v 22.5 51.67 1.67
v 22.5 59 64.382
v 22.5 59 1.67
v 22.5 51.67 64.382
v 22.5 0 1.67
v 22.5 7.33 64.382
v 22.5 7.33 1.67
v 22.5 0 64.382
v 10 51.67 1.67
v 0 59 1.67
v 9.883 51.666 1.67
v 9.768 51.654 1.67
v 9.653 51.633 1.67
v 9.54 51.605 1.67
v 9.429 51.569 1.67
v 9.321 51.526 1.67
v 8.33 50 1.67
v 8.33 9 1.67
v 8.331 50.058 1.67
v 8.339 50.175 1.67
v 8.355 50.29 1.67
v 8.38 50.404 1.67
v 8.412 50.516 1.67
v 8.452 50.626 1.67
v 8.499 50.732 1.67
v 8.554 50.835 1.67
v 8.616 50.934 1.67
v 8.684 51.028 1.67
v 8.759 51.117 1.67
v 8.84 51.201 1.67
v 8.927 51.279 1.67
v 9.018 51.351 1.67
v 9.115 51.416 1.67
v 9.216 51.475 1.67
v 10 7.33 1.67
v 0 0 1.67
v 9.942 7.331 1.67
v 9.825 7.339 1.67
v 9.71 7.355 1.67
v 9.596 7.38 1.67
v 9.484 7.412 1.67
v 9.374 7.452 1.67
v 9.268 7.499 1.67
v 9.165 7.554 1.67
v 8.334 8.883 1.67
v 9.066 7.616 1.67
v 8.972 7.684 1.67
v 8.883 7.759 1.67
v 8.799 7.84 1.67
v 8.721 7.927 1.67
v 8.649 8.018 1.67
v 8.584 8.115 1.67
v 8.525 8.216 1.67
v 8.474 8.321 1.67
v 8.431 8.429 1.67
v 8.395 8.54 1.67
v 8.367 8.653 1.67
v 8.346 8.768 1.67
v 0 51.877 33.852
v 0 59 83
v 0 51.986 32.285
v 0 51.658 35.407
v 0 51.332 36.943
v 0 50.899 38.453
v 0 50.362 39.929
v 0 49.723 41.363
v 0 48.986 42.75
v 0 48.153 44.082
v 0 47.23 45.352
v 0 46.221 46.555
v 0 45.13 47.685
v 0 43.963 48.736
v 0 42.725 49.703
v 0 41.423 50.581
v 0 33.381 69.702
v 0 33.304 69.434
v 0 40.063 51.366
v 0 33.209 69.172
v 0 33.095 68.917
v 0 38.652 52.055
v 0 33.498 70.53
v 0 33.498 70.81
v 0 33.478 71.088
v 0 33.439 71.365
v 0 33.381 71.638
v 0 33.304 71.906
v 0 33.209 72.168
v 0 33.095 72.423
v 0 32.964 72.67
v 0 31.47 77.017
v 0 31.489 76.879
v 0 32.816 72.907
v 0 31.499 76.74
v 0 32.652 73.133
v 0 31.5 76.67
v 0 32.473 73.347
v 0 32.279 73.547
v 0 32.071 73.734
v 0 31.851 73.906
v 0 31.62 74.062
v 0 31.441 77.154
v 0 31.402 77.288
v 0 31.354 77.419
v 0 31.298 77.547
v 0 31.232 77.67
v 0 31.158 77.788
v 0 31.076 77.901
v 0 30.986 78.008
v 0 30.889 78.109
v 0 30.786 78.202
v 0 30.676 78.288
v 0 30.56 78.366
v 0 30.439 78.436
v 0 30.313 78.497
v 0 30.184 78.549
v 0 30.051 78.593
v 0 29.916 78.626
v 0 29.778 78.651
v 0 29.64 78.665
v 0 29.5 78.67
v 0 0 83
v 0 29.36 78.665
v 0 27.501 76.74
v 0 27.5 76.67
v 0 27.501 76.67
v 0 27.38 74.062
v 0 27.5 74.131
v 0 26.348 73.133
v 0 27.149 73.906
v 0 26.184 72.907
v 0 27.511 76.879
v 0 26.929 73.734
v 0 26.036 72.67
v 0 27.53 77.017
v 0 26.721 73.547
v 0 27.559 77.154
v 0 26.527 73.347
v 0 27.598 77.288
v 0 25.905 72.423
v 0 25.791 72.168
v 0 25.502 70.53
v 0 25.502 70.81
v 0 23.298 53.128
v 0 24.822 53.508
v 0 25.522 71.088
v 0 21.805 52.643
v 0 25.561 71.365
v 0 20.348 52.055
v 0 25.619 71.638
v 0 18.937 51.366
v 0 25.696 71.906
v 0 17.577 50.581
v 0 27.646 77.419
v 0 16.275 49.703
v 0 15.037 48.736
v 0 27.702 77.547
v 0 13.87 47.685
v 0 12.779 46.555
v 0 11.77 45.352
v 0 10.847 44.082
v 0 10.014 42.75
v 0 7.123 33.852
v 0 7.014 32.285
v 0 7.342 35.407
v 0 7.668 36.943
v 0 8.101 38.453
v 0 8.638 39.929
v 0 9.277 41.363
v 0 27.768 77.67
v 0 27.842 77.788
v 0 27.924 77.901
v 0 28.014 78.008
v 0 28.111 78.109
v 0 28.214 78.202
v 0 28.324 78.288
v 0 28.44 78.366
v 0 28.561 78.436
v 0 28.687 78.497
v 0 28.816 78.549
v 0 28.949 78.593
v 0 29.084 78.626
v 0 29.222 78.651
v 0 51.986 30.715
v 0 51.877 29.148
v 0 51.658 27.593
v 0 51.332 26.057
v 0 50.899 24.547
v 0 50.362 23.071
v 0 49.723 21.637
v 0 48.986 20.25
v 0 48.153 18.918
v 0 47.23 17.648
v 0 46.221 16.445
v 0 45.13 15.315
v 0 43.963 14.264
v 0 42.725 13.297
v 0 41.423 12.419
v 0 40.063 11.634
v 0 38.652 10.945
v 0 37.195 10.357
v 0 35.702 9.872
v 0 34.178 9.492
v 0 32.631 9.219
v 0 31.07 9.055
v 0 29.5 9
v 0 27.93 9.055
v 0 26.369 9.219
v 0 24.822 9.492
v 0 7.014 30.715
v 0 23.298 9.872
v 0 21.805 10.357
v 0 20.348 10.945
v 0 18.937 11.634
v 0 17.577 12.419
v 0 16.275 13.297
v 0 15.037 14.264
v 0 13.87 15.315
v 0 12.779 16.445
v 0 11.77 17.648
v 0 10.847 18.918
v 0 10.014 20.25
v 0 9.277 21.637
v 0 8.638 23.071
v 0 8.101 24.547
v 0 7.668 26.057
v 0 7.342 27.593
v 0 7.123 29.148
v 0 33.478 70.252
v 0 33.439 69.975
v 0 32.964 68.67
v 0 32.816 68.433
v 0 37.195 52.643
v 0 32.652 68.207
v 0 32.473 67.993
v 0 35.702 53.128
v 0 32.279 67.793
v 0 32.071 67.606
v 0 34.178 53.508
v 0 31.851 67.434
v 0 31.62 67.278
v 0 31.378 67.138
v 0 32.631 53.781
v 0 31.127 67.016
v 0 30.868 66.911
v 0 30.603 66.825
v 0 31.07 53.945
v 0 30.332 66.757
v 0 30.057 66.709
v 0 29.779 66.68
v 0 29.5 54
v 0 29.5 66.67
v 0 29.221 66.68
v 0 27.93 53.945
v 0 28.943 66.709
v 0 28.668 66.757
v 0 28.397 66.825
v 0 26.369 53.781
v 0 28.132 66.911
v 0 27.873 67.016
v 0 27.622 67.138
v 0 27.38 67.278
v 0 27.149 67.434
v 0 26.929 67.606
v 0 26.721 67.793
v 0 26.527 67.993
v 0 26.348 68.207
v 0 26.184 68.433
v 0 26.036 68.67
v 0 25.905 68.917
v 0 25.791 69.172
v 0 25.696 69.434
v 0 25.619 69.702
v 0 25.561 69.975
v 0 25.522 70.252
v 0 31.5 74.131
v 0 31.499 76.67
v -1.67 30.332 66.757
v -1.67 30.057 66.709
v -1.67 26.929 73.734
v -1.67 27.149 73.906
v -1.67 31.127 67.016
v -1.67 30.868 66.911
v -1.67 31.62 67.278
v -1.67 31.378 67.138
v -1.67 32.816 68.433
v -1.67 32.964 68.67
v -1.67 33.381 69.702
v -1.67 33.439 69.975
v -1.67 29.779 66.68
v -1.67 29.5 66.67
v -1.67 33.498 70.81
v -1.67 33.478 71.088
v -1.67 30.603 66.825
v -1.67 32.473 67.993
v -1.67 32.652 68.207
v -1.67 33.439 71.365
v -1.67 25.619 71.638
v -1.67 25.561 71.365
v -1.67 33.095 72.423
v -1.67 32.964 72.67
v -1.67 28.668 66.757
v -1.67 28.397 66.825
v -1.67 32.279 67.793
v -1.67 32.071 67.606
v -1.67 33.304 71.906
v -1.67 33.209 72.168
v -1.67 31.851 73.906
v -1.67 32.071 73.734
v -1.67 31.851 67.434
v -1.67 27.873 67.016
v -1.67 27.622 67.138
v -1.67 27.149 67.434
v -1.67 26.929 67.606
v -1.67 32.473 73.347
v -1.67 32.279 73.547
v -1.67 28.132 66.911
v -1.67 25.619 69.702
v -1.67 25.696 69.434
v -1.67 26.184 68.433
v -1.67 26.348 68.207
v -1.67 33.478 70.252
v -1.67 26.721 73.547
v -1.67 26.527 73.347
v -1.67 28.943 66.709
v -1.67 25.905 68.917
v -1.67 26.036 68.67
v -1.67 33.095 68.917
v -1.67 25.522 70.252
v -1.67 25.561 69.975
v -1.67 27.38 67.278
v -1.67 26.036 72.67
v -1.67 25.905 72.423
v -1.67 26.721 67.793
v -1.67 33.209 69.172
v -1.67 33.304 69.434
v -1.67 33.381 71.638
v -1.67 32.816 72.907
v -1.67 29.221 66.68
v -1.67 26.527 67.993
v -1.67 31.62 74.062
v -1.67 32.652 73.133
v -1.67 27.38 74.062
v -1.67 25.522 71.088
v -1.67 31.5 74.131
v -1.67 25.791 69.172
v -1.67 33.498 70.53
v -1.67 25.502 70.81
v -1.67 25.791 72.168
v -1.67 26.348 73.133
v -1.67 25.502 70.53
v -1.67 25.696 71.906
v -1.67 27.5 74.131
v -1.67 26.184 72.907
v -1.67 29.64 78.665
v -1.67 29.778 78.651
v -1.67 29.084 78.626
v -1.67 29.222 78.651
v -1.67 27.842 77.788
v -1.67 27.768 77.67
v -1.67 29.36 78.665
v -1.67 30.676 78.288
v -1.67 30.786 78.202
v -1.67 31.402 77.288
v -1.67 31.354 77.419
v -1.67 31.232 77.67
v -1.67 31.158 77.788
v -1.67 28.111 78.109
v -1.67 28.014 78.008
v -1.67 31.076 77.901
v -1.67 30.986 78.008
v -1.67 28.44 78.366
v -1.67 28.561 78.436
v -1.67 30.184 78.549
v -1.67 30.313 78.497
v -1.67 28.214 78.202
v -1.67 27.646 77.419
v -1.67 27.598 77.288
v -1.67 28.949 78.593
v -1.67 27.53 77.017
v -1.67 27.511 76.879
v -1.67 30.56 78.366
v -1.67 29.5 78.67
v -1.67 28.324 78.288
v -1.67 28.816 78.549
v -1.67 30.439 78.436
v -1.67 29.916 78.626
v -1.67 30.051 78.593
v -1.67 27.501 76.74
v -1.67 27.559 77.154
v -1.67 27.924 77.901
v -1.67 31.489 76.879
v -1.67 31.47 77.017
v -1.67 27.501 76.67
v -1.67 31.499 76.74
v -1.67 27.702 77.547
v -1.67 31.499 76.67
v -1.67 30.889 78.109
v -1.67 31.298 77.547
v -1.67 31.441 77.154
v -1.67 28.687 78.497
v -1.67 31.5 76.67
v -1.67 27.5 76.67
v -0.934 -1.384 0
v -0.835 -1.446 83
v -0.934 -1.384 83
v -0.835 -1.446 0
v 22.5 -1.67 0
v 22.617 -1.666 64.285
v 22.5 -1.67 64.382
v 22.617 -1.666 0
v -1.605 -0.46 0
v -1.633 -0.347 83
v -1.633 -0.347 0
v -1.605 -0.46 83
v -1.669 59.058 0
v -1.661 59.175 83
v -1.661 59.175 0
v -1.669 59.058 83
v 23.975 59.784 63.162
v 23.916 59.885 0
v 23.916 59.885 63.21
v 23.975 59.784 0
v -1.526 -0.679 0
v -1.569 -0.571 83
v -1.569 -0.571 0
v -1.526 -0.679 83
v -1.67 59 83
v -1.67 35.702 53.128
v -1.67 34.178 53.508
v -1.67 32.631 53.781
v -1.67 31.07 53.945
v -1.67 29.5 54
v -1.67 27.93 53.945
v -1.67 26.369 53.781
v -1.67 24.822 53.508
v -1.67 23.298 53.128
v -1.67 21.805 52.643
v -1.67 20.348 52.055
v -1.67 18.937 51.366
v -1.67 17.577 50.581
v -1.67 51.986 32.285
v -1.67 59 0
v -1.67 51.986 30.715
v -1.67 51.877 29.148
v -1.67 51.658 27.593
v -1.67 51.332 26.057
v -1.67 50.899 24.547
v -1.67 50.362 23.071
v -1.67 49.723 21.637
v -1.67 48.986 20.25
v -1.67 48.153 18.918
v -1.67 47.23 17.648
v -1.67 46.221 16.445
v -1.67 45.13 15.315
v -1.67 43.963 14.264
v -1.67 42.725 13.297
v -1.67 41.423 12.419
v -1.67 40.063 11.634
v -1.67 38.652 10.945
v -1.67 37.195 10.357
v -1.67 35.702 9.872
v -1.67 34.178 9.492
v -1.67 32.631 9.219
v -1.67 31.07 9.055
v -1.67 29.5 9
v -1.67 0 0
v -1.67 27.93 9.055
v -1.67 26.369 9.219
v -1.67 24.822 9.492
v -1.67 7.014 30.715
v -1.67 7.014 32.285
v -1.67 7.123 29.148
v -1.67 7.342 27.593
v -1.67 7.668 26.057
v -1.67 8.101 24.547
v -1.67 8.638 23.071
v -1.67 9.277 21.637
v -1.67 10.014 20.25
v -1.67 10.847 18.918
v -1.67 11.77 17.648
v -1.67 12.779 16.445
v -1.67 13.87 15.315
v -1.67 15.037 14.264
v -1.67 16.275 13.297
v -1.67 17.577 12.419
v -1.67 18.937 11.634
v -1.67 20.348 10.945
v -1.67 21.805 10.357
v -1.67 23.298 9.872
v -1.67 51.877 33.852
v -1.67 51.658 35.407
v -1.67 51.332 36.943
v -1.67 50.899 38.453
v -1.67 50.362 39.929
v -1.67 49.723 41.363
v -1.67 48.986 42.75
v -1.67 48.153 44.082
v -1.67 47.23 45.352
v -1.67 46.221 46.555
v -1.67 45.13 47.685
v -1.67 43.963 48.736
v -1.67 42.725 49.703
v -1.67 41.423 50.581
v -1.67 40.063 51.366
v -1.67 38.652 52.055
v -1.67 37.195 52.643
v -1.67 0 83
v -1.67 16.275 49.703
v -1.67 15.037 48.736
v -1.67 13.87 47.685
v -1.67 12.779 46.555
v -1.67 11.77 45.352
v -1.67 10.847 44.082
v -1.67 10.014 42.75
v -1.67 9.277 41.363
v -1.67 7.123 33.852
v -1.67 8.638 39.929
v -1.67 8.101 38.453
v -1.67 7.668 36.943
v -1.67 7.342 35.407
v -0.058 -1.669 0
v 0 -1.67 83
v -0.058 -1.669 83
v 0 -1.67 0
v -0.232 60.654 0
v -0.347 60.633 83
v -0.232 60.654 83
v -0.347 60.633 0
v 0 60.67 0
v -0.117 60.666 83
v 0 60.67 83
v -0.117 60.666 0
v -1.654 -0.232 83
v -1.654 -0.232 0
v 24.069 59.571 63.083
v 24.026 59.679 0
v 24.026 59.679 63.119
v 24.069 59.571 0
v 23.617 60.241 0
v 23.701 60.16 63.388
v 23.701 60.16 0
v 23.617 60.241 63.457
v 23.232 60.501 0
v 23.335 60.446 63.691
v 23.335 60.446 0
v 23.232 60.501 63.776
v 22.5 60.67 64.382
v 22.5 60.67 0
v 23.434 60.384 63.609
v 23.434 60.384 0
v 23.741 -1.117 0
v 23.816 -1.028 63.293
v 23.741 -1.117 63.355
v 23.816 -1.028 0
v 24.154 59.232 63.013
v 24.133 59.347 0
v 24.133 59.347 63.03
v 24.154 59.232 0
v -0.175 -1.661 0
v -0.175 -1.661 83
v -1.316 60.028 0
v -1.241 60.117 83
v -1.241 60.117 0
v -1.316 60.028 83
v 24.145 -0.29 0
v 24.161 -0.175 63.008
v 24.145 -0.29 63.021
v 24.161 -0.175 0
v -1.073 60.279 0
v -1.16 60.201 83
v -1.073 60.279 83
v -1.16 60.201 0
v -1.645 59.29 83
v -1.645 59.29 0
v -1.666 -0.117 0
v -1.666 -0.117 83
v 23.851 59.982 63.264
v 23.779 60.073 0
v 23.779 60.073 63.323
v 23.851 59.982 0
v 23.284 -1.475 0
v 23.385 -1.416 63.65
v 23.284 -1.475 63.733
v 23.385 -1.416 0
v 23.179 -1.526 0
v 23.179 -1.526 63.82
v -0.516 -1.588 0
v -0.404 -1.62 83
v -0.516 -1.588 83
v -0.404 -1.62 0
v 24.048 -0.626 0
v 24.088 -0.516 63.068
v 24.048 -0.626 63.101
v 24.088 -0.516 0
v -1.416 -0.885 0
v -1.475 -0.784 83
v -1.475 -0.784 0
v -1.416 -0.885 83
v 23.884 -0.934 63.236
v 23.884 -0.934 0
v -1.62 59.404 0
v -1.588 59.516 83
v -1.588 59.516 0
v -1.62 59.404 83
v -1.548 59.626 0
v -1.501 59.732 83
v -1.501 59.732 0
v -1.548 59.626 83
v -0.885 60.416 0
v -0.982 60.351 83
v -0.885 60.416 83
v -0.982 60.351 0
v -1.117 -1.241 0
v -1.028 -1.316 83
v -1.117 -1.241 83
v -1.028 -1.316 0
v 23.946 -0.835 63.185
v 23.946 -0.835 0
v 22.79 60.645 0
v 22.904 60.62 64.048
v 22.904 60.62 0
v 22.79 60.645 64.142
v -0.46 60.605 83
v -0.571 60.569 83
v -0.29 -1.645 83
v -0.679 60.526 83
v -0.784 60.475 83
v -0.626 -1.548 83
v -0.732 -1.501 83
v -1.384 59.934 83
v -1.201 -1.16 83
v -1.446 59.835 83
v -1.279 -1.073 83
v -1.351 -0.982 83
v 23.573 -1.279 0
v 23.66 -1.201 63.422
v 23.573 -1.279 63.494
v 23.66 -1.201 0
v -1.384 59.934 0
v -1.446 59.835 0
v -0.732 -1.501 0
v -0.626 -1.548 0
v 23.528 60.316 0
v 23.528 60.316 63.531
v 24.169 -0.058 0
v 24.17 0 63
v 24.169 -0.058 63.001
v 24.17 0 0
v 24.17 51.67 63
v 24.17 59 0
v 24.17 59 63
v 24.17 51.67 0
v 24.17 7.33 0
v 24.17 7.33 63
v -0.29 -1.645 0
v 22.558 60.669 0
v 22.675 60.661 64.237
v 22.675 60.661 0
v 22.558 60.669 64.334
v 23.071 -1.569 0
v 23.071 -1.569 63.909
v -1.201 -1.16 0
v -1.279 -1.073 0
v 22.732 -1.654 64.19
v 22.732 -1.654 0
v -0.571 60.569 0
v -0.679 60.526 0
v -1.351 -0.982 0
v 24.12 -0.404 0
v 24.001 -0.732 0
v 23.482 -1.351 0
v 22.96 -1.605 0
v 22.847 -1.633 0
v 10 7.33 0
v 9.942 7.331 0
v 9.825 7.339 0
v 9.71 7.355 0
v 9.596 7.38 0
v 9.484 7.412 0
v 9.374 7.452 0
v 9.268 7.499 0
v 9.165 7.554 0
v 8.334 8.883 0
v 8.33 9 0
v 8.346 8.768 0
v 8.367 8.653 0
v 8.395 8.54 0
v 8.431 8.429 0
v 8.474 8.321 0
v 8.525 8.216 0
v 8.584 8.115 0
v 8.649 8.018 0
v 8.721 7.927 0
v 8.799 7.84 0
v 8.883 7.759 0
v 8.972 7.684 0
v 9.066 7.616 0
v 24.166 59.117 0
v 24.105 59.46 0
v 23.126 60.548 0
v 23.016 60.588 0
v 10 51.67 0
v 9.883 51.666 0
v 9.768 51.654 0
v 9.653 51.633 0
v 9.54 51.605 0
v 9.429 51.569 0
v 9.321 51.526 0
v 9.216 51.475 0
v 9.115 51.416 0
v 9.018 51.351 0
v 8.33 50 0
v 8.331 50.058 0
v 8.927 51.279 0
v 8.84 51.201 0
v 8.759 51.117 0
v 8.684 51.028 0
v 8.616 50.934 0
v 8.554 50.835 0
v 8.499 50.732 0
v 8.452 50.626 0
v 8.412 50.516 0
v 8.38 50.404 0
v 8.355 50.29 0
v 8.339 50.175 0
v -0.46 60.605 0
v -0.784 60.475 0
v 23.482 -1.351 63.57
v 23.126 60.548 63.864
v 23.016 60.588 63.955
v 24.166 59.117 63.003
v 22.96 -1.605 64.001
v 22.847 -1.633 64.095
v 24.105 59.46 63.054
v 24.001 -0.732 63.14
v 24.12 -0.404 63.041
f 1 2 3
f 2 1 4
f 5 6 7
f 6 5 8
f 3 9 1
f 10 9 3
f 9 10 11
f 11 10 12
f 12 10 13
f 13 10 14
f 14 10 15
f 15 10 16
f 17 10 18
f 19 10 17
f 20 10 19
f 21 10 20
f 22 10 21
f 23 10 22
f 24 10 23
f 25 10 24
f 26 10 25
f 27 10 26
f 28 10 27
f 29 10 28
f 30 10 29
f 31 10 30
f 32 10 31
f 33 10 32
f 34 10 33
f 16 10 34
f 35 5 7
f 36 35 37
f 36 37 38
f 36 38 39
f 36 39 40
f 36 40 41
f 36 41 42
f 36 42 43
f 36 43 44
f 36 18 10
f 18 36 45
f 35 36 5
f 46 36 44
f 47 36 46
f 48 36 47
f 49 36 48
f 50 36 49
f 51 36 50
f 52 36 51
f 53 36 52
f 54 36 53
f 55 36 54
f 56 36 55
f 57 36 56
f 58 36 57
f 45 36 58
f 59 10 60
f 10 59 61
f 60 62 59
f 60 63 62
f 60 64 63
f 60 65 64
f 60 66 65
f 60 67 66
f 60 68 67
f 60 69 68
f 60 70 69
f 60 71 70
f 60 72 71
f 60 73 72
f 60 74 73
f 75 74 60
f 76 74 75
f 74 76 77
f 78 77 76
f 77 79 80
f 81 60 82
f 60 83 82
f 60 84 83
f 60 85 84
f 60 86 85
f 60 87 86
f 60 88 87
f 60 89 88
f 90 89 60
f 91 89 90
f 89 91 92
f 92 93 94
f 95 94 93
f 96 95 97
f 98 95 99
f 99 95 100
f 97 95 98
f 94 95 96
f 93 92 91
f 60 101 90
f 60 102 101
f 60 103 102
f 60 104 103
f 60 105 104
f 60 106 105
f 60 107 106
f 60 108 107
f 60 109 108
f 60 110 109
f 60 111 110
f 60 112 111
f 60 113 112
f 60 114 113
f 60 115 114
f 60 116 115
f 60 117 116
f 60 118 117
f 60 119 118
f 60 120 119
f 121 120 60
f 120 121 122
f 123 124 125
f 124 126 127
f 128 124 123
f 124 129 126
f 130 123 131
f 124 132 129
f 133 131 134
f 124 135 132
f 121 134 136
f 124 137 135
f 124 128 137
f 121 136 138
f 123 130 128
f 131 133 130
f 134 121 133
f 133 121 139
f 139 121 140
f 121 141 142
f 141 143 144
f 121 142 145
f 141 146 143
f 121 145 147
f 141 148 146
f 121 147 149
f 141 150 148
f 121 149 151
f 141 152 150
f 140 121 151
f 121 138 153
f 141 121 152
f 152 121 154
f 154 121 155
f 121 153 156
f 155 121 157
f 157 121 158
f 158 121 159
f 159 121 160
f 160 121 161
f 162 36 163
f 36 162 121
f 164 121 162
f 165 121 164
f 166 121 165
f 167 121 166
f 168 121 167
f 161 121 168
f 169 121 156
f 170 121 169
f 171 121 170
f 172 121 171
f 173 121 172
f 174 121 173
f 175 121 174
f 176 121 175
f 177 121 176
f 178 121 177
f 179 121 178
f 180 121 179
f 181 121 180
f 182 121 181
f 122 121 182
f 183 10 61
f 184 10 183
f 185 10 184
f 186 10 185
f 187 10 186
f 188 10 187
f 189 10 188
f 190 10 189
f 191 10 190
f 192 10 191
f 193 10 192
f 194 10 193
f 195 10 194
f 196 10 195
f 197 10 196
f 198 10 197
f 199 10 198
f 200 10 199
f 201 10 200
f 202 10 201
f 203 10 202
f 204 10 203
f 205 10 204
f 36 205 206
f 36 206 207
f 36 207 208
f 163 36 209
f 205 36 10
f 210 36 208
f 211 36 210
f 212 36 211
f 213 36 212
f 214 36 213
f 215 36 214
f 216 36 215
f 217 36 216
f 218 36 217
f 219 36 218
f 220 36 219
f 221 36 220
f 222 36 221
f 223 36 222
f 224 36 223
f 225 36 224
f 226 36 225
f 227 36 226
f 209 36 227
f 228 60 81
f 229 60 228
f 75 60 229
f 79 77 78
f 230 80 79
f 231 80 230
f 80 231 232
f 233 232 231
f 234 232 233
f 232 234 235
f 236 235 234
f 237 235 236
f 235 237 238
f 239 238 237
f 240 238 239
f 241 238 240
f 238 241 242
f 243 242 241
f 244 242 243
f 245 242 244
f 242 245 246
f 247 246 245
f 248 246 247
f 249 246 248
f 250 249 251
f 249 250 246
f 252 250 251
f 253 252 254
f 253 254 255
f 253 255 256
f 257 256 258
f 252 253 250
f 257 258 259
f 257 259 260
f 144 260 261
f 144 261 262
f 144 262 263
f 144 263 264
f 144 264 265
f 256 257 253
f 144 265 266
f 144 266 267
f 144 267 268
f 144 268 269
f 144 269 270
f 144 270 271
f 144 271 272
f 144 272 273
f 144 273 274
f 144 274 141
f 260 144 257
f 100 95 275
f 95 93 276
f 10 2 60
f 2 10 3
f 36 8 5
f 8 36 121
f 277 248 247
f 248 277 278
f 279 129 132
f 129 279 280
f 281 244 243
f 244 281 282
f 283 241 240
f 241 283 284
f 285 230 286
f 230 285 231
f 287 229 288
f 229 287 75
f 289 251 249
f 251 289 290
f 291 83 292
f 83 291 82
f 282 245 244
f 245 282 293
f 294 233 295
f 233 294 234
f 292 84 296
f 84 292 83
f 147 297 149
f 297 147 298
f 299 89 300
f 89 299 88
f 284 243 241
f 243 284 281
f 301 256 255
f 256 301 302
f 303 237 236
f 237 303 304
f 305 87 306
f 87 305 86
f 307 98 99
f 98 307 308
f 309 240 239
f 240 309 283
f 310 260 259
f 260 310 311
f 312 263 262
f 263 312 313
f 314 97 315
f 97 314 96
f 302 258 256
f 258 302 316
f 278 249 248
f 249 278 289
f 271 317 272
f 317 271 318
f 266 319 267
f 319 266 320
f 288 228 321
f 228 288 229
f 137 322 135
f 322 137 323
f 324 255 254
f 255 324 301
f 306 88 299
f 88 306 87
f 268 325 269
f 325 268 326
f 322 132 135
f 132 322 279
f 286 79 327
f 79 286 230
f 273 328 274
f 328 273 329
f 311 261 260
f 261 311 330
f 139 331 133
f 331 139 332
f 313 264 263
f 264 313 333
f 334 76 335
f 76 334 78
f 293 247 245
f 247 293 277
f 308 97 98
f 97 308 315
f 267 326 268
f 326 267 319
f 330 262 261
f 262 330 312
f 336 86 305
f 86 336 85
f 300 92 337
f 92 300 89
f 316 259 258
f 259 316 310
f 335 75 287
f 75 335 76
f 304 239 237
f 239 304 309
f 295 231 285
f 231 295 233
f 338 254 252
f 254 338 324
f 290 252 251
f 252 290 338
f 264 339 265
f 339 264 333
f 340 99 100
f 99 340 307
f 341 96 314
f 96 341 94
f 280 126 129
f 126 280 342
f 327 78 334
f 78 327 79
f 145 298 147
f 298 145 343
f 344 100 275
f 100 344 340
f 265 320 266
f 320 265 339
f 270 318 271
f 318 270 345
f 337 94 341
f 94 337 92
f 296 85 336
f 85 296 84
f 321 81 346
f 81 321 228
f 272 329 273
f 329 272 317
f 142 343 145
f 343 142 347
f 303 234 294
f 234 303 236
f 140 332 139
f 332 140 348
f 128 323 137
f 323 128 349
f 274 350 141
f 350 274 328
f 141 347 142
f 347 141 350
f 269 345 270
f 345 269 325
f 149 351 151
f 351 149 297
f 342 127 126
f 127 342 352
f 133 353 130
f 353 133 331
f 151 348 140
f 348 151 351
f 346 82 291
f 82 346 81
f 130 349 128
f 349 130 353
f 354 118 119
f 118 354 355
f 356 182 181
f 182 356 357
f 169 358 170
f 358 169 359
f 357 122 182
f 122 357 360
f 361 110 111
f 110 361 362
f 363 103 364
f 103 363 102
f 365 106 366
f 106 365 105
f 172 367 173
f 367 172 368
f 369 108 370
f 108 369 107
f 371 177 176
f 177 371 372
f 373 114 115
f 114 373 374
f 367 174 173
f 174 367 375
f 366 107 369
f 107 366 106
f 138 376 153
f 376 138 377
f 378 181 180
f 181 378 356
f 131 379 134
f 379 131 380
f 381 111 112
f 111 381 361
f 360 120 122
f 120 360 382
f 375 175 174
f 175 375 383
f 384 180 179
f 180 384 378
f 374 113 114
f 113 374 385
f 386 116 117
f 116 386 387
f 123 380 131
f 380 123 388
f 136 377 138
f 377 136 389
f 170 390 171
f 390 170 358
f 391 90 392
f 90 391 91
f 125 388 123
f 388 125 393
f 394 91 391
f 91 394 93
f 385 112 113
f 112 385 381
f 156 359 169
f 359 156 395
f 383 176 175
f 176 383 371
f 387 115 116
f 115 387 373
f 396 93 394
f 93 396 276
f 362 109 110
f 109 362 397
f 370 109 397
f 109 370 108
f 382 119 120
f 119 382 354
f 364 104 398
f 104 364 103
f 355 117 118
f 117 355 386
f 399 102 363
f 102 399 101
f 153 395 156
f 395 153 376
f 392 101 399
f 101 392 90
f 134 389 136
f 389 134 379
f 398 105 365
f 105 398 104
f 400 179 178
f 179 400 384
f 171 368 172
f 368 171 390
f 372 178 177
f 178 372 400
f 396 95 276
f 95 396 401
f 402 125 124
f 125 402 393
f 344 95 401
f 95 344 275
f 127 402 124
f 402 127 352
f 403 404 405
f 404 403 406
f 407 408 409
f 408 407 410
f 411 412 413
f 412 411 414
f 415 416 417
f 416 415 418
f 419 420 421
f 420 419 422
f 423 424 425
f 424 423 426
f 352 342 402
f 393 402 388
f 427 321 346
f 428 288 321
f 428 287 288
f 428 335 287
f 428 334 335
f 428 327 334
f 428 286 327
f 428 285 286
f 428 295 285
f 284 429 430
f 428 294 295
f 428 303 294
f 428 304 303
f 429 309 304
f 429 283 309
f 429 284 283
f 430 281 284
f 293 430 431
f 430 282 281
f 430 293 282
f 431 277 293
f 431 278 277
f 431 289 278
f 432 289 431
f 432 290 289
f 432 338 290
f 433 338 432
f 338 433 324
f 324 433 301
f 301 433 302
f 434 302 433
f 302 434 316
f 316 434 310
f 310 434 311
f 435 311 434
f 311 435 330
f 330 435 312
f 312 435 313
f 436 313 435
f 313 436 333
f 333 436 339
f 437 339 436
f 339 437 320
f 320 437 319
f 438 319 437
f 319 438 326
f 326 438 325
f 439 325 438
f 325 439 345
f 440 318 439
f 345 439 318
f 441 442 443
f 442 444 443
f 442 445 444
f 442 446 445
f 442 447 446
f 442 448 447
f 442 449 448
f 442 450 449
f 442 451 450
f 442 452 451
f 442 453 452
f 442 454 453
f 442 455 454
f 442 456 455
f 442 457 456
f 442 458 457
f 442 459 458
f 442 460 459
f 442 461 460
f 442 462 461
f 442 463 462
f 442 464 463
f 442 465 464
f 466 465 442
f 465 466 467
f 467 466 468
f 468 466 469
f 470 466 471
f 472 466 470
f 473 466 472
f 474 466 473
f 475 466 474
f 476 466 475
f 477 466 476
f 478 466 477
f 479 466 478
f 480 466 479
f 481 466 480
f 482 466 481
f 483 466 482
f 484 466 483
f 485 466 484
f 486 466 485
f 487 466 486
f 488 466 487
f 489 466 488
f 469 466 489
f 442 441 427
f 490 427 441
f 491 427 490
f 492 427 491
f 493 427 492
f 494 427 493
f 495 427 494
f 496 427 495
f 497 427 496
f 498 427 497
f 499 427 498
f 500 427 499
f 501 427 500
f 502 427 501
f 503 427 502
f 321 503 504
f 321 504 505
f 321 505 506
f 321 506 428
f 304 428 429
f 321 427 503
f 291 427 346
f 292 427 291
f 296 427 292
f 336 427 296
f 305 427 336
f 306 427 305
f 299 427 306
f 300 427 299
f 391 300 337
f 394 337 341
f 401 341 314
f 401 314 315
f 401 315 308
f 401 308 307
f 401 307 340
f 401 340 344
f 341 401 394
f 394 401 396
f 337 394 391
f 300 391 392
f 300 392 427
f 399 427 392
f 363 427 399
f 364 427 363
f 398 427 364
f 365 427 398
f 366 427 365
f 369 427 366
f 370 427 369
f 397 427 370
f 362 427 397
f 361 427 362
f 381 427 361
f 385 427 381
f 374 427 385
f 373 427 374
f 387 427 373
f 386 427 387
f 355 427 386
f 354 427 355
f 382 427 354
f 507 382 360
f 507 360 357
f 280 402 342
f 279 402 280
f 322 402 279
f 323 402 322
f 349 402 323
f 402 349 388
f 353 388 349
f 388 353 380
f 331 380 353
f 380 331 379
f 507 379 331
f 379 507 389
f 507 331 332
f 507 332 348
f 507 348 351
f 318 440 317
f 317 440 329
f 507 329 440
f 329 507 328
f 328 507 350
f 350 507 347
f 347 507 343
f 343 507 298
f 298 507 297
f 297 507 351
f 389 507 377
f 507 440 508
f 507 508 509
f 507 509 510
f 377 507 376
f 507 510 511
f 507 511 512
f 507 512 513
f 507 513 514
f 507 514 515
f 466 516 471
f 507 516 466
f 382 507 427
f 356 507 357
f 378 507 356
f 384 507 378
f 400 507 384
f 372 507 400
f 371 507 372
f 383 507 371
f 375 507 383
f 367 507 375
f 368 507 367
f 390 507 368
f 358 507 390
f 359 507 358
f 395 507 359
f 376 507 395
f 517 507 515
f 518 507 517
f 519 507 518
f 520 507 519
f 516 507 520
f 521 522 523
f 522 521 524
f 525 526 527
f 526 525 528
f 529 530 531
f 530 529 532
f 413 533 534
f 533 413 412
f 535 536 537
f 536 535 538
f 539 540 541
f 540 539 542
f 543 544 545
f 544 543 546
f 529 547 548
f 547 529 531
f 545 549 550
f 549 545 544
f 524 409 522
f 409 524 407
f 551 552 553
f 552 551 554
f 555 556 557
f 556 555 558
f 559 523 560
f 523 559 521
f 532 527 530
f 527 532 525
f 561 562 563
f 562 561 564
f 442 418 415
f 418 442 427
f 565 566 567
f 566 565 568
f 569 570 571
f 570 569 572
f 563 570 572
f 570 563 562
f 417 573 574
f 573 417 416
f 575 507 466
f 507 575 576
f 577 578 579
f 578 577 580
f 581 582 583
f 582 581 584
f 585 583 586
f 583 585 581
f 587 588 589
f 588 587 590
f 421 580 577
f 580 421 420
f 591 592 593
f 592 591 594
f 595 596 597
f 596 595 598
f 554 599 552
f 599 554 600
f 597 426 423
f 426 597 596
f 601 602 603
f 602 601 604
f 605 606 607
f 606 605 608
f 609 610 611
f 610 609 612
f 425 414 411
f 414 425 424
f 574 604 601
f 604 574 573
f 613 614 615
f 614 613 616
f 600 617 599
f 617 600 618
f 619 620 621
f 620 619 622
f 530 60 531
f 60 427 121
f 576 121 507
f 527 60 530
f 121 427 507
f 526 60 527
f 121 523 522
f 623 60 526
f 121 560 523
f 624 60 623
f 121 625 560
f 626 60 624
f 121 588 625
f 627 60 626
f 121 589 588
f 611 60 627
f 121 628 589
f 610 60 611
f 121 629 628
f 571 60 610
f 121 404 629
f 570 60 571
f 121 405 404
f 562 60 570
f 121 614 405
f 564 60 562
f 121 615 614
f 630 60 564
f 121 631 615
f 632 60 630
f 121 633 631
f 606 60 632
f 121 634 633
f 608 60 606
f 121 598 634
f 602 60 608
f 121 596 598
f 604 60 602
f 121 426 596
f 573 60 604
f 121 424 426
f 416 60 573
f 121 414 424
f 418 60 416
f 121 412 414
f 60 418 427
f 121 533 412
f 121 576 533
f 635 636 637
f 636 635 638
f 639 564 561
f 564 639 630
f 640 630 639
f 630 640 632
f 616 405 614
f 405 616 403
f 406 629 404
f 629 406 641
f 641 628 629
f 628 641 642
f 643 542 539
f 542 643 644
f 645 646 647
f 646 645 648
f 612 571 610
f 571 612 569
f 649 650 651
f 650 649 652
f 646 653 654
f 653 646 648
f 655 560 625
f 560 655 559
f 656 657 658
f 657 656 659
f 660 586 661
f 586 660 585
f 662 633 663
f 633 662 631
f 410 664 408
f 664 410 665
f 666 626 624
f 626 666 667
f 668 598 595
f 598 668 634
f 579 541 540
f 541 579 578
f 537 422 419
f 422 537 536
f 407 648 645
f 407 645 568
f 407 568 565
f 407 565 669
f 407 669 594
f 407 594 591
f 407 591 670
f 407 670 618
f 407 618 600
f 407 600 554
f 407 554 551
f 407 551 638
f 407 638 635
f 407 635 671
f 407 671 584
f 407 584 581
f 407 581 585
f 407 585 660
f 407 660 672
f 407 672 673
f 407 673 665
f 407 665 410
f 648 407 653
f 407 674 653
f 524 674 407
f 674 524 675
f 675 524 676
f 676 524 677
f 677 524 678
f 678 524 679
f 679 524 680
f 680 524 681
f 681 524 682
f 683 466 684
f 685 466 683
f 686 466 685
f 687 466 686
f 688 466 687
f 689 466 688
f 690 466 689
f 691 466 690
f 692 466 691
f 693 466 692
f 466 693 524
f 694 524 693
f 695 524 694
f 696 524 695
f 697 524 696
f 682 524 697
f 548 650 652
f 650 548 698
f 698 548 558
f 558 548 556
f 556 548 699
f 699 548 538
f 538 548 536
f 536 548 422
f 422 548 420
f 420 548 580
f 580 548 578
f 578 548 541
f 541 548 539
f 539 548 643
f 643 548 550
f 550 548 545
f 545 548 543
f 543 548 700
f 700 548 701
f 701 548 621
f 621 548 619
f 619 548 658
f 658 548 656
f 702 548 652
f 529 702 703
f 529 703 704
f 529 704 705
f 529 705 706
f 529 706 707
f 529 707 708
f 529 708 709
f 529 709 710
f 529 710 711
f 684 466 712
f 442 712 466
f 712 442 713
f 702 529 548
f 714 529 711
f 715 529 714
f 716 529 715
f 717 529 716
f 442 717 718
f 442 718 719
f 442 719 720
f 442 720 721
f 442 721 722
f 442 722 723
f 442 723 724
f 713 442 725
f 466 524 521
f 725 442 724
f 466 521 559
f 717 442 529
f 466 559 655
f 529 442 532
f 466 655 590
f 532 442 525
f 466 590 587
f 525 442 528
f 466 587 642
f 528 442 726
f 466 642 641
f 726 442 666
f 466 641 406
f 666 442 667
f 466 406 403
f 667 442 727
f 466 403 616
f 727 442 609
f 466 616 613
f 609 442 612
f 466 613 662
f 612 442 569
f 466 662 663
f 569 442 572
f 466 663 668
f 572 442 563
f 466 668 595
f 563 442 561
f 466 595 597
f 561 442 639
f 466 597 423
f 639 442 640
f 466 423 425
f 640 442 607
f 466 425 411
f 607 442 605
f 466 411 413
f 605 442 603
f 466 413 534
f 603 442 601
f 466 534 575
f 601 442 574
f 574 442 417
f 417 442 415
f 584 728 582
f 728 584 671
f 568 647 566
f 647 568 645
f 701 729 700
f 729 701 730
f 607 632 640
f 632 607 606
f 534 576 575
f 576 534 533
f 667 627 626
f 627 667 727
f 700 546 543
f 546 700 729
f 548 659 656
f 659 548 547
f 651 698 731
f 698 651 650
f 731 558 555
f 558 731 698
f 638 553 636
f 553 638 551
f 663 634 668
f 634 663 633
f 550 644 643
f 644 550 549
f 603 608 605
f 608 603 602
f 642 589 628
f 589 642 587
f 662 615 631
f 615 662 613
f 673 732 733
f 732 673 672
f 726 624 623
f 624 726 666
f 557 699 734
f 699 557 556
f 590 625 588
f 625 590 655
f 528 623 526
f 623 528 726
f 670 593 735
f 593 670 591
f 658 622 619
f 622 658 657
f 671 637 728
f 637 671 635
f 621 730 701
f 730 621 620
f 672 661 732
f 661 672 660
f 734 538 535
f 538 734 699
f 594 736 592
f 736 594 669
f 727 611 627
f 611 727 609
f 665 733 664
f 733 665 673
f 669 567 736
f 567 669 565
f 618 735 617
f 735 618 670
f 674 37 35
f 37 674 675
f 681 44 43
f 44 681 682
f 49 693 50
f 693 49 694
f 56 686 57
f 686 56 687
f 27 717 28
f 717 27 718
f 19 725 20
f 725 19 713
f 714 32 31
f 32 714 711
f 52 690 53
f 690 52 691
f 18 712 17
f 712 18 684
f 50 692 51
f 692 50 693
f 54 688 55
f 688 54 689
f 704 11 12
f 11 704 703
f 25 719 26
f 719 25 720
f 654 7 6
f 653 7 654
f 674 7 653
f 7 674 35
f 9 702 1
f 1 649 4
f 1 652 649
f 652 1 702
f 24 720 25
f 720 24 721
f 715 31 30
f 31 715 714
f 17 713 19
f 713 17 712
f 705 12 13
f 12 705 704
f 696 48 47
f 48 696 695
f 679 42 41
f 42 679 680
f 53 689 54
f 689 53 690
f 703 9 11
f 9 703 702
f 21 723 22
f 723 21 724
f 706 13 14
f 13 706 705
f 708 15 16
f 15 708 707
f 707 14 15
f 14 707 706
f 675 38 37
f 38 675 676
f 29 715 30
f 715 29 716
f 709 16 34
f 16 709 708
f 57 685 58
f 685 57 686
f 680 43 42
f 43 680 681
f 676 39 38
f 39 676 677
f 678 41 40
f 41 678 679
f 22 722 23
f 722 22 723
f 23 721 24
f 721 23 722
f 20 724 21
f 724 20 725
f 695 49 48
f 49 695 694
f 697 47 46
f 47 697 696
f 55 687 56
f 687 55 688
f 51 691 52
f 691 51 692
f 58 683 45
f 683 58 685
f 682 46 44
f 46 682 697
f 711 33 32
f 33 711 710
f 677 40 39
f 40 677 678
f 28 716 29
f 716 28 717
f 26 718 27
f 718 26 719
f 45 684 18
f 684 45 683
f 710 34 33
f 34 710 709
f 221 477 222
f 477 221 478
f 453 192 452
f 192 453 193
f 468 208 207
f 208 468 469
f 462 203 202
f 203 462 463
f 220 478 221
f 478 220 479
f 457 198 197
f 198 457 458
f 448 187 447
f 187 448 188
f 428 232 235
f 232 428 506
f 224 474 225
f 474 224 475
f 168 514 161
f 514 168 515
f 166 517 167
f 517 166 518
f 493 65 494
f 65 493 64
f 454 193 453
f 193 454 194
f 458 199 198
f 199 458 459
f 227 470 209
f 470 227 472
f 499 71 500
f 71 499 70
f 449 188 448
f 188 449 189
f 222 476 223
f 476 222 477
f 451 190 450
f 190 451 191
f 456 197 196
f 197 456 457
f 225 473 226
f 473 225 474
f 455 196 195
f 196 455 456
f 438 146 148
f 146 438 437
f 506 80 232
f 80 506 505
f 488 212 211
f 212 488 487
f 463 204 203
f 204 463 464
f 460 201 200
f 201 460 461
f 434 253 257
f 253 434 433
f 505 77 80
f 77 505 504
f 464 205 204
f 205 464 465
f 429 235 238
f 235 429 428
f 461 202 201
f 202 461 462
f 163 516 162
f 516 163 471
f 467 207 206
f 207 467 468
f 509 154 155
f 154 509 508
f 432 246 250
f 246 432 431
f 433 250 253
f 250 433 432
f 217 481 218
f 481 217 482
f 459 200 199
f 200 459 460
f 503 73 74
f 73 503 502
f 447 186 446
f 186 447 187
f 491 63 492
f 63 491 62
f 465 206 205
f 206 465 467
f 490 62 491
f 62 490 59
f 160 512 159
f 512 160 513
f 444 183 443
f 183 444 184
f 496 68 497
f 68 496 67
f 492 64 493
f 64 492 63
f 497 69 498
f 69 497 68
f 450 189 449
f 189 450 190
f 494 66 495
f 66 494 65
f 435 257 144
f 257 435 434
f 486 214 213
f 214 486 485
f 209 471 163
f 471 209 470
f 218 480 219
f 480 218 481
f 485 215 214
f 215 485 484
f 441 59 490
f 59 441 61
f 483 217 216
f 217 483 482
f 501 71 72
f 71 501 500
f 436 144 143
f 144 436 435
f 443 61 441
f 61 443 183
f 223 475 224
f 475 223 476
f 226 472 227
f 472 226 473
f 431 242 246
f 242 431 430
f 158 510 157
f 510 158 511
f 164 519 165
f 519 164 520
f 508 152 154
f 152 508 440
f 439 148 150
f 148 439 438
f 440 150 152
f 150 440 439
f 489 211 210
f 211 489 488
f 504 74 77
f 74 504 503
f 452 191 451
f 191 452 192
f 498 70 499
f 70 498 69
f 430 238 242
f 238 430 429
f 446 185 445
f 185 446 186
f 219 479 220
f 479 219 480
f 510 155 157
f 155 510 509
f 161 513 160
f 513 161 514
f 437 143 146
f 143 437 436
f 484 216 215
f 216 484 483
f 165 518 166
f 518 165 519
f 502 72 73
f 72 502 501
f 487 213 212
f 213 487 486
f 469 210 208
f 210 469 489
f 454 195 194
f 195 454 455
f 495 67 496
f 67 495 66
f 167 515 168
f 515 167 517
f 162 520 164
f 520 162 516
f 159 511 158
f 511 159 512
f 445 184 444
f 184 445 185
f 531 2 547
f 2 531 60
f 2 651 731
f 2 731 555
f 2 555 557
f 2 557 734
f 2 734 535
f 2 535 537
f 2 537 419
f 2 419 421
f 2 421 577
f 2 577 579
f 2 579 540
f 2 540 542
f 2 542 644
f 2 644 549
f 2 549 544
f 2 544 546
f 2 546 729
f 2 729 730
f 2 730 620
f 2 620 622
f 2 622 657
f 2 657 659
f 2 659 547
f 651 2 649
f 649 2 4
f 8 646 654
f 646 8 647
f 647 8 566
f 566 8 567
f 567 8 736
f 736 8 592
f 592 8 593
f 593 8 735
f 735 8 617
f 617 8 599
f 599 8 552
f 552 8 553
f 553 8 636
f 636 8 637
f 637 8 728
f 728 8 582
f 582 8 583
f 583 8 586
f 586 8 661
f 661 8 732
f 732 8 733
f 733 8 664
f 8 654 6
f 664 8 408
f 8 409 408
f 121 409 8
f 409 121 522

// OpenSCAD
/*
 * Sonoff SNZB-02WD holder
 *
 * Author: Pavel Rampas
 * Version: 1.0.0 (Changelog is at the bottom)
 * License: CC BY-SA 4.0 [https://creativecommons.org/licenses/by-sa/4.0/]
 * Link: https://github.com/pavelrampas/openscad-models
 *
 * OpenSCAD version: 2021.01
 *
 * Instructions:
 * Set up parameters, render and print.
 *
 * Height is layer.
 * Thickness is perimeter.
 */

// Parameters
//------------------------------------------------------------------------------

$fn = $preview ? 15 : 90;

// Parameters that don't need to be changed
//------------------------------------------------------------------------------

thickness = 1.67;
height = 22 + 0.5;
width = 58.5 + 0.5;
length = 63;

holderLength = 20;
holderHoleSmall = 4;
holderHoleLarge = 8;

frontHole = width - 18;

backHoleD = 45;

// Code
//------------------------------------------------------------------------------

// Box
difference() {
    // Box
    linear_extrude(length + holderLength) {
        offset(r = thickness) {
            square([height, width]);
        }
    }

    // Sonoff
    translate([0, 0, thickness]) {
        cube([height, width, length + holderLength]);
        #cube([height, width, length]);
    }

    // Hole front
    translate([10, (width - frontHole) / 2, 0]) {
        linear_extrude(length + holderLength) {
            offset(r = thickness) {
                square([height, frontHole]);
            }
        }
    }

    // Hole back
    translate([-thickness, width / 2, length / 2]) {
        rotate([0, 90, 0]) {
            cylinder(h = height, d = backHoleD);
        }
    }

    // Hole holder
    translate([-thickness, 0, length + thickness + (holderHoleLarge / 2) + 2]) {
        translate([0, width / 2, 0]) {
            rotate([0, 90, 0]) {
                cylinder(h = thickness * 2, d = holderHoleLarge);
            }
        }
        translate([0, width / 2, 6]) {
            rotate([0, 90, 0]) {
                cylinder(h = thickness * 2, d = holderHoleSmall);
            }
        }
        translate([0, (width / 2) - 2, 0]) {
            cube([thickness * 2, holderHoleSmall, 6]);
        }
    }
    translate([0, width + thickness, length]) {
        rotate([90, 0, 0]) {
            linear_extrude(width + (2 * thickness)) {
                polygon([
                    [height + thickness, 0],
                    [height + thickness, holderLength],
                    [0, holderLength]
                ]);
            }
        }
    }
}

// Functions
//------------------------------------------------------------------------------

// Modules
//------------------------------------------------------------------------------

// Changelog
//------------------------------------------------------------------------------

// [1.0.0]:
// Initial release.
